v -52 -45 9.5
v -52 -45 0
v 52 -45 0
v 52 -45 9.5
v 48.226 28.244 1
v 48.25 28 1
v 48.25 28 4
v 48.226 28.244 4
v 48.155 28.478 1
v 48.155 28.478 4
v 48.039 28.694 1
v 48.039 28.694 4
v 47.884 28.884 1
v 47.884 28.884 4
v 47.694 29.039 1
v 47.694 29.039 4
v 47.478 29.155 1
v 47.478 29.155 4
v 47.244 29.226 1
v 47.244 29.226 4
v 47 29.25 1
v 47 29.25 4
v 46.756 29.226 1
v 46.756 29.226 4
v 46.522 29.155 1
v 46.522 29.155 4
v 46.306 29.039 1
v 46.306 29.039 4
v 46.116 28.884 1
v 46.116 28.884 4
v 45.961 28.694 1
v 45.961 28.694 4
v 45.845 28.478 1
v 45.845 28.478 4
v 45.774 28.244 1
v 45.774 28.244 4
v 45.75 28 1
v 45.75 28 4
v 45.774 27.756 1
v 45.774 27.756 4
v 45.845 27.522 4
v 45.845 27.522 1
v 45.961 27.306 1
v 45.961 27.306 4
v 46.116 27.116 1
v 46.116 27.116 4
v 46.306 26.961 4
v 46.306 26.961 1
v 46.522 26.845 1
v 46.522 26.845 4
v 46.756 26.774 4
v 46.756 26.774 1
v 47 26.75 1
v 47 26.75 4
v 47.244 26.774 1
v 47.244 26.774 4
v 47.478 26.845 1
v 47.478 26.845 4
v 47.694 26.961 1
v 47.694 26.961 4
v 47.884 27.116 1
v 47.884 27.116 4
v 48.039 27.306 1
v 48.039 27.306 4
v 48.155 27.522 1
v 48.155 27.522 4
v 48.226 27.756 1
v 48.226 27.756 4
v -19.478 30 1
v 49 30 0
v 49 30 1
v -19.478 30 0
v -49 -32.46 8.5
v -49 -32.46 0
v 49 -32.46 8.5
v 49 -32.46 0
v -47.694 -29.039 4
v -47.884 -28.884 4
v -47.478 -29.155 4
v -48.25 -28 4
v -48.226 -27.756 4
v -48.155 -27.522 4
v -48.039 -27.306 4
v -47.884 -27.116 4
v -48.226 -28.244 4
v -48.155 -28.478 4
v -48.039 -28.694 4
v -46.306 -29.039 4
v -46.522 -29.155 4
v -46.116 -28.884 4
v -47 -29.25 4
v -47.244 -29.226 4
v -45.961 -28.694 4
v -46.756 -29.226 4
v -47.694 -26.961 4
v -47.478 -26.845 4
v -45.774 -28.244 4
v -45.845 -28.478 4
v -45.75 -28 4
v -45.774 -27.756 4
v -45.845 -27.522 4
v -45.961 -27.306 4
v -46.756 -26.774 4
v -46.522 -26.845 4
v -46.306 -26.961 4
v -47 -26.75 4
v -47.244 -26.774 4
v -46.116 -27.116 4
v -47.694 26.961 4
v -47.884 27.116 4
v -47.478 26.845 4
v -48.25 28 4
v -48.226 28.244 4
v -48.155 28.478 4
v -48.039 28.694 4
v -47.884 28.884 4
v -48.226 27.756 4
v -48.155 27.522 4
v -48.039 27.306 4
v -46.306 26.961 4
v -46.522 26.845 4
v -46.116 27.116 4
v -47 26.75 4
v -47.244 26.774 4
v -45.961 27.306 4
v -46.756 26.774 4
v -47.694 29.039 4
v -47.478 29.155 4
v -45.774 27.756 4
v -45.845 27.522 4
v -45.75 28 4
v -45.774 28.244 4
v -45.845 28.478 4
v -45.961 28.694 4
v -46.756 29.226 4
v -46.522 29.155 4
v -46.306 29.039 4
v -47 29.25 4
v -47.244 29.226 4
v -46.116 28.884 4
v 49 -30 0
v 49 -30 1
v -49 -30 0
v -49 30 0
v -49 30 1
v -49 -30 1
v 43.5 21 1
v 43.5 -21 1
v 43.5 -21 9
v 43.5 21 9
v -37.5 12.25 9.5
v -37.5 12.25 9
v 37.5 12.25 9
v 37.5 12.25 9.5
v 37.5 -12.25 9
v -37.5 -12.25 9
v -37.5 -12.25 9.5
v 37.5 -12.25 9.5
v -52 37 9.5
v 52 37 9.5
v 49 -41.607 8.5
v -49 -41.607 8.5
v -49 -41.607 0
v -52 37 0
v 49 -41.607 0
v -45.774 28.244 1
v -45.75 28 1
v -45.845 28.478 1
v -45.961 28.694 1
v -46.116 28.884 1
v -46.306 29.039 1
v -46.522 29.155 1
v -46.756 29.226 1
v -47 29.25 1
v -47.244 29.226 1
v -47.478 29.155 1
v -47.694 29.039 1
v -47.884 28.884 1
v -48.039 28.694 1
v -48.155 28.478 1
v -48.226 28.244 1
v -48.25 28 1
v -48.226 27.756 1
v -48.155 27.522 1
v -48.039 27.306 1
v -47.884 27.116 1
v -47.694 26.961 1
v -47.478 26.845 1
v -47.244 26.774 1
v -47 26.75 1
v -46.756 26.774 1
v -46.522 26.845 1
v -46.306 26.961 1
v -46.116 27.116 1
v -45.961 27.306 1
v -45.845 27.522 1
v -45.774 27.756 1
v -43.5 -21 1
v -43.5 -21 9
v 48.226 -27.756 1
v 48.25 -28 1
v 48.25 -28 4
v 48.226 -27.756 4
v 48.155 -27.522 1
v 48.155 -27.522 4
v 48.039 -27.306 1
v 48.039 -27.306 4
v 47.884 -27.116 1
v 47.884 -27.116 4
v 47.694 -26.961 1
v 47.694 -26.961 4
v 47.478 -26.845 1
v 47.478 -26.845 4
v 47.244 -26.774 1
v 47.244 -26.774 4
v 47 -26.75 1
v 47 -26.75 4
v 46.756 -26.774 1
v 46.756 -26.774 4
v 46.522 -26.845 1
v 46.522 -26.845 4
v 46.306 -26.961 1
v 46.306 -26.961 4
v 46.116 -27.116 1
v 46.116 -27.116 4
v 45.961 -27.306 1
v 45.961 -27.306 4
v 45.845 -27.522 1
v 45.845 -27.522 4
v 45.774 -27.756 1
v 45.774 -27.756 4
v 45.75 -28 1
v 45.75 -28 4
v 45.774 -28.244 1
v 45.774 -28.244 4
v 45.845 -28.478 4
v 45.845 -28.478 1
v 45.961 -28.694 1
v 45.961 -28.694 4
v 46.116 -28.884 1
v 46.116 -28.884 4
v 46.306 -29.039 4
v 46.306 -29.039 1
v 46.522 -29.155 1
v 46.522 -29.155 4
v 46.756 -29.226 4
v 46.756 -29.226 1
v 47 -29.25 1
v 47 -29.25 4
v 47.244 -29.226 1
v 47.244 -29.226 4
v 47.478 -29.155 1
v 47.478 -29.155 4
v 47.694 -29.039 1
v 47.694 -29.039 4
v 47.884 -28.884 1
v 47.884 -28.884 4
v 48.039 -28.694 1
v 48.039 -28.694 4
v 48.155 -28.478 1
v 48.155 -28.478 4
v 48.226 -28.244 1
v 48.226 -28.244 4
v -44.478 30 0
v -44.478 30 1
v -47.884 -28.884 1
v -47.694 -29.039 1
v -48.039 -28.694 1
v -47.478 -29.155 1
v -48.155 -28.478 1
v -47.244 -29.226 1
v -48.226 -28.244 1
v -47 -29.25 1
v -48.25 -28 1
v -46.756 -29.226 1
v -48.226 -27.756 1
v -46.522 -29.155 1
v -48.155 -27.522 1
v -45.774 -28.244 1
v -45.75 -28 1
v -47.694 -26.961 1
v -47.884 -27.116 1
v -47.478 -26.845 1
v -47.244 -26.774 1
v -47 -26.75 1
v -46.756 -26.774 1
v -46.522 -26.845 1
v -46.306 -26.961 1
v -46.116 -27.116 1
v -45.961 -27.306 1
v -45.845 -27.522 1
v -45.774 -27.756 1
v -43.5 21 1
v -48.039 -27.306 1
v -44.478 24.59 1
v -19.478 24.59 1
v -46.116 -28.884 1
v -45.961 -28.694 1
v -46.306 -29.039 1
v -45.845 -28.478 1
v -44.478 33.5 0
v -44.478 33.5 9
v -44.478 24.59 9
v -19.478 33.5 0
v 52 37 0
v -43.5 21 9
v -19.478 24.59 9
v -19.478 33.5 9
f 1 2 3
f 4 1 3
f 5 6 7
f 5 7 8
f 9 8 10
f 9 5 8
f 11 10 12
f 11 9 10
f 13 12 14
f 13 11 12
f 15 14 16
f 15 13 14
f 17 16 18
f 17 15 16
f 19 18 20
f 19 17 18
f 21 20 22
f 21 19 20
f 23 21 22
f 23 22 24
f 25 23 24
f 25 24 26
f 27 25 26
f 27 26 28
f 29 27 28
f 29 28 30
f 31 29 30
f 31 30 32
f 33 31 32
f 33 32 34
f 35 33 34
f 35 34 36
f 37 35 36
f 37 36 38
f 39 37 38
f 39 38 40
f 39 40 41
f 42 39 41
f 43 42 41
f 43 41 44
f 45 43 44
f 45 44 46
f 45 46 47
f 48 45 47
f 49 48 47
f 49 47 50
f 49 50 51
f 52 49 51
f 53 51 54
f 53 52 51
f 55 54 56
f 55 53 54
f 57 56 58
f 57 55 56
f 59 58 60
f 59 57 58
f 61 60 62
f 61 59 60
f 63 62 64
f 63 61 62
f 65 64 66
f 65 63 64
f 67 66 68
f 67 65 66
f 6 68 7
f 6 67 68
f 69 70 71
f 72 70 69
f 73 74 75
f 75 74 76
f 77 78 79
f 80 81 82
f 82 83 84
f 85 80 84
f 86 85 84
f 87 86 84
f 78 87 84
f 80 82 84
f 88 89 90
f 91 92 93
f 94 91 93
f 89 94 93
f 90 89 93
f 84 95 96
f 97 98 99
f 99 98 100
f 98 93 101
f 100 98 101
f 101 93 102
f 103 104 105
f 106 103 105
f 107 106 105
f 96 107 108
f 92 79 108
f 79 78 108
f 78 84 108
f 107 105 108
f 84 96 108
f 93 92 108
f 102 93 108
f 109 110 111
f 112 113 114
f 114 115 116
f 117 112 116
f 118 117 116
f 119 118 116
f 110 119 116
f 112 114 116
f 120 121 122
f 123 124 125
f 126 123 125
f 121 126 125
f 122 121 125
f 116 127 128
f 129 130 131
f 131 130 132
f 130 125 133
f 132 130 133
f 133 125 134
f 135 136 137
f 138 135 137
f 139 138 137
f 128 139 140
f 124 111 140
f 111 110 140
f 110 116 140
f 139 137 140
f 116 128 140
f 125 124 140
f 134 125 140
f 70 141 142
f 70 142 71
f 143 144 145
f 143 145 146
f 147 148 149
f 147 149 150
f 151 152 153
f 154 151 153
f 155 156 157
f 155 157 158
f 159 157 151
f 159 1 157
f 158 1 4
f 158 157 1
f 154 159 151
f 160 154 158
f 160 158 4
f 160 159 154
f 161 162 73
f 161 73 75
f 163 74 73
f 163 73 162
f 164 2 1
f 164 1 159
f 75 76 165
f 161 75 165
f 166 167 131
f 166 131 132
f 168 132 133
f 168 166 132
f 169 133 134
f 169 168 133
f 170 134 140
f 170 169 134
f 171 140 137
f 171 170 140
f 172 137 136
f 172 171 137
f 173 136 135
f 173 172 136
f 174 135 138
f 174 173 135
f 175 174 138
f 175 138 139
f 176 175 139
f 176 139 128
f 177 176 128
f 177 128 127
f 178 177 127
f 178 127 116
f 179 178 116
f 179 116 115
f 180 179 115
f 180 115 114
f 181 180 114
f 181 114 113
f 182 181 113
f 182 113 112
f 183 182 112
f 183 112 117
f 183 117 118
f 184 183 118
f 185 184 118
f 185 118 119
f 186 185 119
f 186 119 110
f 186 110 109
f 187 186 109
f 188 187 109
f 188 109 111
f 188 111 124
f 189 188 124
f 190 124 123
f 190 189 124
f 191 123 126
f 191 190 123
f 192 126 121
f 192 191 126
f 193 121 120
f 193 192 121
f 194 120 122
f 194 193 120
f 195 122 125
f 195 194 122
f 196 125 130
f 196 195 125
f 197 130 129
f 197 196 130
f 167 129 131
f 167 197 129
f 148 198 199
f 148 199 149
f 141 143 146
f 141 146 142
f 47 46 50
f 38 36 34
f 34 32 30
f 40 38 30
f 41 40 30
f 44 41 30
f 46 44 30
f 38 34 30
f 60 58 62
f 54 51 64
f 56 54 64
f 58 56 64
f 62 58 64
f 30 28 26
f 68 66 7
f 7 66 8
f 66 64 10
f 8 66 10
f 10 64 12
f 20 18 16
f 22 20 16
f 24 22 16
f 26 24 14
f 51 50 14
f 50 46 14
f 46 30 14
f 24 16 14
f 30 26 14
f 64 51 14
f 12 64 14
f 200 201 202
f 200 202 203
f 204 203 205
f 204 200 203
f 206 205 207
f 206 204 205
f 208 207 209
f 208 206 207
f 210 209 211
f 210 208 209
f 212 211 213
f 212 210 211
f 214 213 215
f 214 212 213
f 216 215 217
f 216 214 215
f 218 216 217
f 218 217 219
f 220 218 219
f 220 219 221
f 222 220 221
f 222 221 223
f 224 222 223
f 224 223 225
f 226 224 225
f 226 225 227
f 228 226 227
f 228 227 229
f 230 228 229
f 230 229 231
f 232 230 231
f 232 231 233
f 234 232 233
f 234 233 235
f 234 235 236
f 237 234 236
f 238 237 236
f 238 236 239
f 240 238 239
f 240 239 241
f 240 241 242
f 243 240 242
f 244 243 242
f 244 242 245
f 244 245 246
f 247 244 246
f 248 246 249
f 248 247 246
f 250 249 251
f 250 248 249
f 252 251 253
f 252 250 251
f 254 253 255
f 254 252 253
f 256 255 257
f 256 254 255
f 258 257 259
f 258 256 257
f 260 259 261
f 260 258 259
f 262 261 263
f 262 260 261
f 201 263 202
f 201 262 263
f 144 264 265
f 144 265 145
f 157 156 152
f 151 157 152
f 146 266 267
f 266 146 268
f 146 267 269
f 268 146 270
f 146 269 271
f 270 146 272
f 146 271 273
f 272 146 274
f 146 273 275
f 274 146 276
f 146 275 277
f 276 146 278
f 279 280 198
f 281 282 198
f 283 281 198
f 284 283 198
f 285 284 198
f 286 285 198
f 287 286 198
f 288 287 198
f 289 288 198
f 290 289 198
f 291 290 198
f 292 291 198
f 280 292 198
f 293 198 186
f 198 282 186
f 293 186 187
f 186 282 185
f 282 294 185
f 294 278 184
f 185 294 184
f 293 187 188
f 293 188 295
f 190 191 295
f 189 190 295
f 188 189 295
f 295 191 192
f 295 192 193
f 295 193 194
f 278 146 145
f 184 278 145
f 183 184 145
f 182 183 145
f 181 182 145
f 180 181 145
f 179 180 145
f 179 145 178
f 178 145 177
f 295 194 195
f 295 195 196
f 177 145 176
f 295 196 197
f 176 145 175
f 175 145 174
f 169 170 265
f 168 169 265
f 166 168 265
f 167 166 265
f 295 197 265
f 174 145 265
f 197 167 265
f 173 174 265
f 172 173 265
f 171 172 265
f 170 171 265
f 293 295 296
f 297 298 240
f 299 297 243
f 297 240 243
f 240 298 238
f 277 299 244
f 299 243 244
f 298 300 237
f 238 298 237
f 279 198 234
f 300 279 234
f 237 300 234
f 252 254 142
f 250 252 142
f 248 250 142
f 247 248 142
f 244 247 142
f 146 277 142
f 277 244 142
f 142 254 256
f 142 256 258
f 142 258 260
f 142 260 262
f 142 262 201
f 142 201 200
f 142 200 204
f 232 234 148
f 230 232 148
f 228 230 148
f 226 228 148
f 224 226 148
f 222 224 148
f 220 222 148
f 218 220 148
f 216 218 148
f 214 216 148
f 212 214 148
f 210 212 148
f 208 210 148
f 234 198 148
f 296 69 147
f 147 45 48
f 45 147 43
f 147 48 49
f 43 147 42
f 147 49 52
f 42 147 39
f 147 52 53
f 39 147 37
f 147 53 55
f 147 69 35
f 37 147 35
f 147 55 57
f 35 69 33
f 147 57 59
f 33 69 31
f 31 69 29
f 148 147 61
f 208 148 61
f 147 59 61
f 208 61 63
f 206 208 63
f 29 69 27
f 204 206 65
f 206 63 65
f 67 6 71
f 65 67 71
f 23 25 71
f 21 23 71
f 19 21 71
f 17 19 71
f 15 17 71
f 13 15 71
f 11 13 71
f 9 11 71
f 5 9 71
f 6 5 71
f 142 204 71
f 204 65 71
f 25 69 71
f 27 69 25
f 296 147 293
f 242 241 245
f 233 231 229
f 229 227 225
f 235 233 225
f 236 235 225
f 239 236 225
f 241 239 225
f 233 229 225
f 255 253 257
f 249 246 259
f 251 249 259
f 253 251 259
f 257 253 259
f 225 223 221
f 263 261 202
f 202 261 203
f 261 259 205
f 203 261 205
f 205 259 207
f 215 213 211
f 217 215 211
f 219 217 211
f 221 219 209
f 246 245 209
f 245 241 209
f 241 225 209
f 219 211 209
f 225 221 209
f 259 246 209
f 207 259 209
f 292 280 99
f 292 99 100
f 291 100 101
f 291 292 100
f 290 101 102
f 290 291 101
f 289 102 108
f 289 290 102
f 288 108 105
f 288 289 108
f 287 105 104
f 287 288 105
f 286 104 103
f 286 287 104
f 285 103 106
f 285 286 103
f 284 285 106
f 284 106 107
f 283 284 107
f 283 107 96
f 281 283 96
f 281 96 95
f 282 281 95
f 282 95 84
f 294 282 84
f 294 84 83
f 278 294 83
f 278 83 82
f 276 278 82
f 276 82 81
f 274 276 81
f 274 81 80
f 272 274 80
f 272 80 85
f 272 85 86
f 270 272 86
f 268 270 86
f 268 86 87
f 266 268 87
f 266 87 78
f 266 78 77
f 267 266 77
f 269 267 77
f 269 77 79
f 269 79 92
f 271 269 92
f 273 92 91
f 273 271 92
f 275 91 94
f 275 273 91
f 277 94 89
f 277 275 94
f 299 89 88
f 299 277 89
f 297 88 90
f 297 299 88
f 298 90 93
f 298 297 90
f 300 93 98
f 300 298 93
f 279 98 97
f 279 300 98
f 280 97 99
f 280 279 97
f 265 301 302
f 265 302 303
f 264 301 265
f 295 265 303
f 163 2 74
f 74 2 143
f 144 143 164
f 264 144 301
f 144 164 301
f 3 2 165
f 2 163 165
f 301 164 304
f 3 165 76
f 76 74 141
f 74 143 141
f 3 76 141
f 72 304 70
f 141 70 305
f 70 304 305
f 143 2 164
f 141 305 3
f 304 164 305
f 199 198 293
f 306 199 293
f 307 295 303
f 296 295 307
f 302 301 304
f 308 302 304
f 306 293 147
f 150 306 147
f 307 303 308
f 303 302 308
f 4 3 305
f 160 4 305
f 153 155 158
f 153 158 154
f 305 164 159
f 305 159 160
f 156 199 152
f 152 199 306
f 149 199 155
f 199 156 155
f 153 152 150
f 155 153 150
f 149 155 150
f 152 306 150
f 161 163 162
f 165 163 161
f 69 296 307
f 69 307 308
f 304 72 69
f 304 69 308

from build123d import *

# Parameters (mm, degrees)
F1_W     = 104
F1_H     = 82
F1_W_2   = 87
F1_H_2   = 42
F1_W_3   = 75
F1_H_3   = 24.5
F1_W_4   = 25
F1_H_4   = 5.41
F1_H_5   = 3.5
F2_DEPTH = 9.5
F3_DEPTH = 9
F4_DEPTH = 1
F0_R     = 1.25
F5_DEPTH = 4
F6_W     = 98
F6_H     = 9.1468319297
F7_DEPTH = 8.5


with BuildPart() as f2:
    # F1 (on Top) → F2 (new body)
    with BuildSketch(Plane.XY):
        with Locations((0, -4)):
            Rectangle(F1_W, F1_H)
        Polygon((-44.4778376818, 30), (-44.4778376818, 33.5), (-19.4778376818, 33.5), (-19.4778376818, 30), (49, 30), (49, -30), (-49, -30), (-49, 30), align=None, mode=Mode.SUBTRACT)
        Polygon((-44.4778376818, 24.59), (-44.4778376818, 30), (-49, 30), (-49, -30), (49, -30), (49, 30), (-19.4778376818, 30), (-19.4778376818, 24.59), align=None)
        Rectangle(F1_W_2, F1_H_2, mode=Mode.SUBTRACT)
        Rectangle(F1_W_2, F1_H_2)
        Rectangle(F1_W_3, F1_H_3, mode=Mode.SUBTRACT)
        with Locations((-31.9778376818, 27.295)):
            Rectangle(F1_W_4, F1_H_4)
        with Locations((-31.9778376818, 31.75)):
            Rectangle(F1_W_4, F1_H_5)
    extrude(amount=F2_DEPTH)

    # F1 (on Top) → F3 (cut)
    with BuildSketch(Plane.XY):
        Rectangle(F1_W_2, F1_H_2)
        Rectangle(F1_W_3, F1_H_3, mode=Mode.SUBTRACT)
        with Locations((-31.9778376818, 27.295)):
            Rectangle(F1_W_4, F1_H_4)
        with Locations((-31.9778376818, 31.75)):
            Rectangle(F1_W_4, F1_H_5)
    extrude(amount=F3_DEPTH, mode=Mode.SUBTRACT)

    # F1 (on Top) → F4 (cut)
    with BuildSketch(Plane.XY):
        Polygon((-44.4778376818, 24.59), (-44.4778376818, 30), (-49, 30), (-49, -30), (49, -30), (49, 30), (-19.4778376818, 30), (-19.4778376818, 24.59), align=None)
        Rectangle(F1_W_2, F1_H_2, mode=Mode.SUBTRACT)
        Rectangle(F1_W_2, F1_H_2)
        Rectangle(F1_W_3, F1_H_3, mode=Mode.SUBTRACT)
        with Locations((-31.9778376818, 27.295)):
            Rectangle(F1_W_4, F1_H_4)
    extrude(amount=F4_DEPTH, mode=Mode.SUBTRACT)

    # F0 (on Top) → F5 (cut)
    with BuildSketch(Plane.XY):
        with Locations((-47, 28)):
            Circle(F0_R)
        with Locations((47, 28)):
            Circle(F0_R)
        with Locations((47, -28)):
            Circle(F0_R)
        with Locations((-47, -28)):
            Circle(F0_R)
    extrude(amount=F5_DEPTH, mode=Mode.SUBTRACT)

    # F6 (on face) → F7 (cut)
    with BuildSketch(Plane(origin=(0, 0, 0), x_dir=(1, 0, 0), z_dir=(0, 0, -1))):
        with Locations((0, 37.0334051549)):
            Rectangle(F6_W, F6_H)
    extrude(amount=-F7_DEPTH, mode=Mode.SUBTRACT)


solid = f2.part
